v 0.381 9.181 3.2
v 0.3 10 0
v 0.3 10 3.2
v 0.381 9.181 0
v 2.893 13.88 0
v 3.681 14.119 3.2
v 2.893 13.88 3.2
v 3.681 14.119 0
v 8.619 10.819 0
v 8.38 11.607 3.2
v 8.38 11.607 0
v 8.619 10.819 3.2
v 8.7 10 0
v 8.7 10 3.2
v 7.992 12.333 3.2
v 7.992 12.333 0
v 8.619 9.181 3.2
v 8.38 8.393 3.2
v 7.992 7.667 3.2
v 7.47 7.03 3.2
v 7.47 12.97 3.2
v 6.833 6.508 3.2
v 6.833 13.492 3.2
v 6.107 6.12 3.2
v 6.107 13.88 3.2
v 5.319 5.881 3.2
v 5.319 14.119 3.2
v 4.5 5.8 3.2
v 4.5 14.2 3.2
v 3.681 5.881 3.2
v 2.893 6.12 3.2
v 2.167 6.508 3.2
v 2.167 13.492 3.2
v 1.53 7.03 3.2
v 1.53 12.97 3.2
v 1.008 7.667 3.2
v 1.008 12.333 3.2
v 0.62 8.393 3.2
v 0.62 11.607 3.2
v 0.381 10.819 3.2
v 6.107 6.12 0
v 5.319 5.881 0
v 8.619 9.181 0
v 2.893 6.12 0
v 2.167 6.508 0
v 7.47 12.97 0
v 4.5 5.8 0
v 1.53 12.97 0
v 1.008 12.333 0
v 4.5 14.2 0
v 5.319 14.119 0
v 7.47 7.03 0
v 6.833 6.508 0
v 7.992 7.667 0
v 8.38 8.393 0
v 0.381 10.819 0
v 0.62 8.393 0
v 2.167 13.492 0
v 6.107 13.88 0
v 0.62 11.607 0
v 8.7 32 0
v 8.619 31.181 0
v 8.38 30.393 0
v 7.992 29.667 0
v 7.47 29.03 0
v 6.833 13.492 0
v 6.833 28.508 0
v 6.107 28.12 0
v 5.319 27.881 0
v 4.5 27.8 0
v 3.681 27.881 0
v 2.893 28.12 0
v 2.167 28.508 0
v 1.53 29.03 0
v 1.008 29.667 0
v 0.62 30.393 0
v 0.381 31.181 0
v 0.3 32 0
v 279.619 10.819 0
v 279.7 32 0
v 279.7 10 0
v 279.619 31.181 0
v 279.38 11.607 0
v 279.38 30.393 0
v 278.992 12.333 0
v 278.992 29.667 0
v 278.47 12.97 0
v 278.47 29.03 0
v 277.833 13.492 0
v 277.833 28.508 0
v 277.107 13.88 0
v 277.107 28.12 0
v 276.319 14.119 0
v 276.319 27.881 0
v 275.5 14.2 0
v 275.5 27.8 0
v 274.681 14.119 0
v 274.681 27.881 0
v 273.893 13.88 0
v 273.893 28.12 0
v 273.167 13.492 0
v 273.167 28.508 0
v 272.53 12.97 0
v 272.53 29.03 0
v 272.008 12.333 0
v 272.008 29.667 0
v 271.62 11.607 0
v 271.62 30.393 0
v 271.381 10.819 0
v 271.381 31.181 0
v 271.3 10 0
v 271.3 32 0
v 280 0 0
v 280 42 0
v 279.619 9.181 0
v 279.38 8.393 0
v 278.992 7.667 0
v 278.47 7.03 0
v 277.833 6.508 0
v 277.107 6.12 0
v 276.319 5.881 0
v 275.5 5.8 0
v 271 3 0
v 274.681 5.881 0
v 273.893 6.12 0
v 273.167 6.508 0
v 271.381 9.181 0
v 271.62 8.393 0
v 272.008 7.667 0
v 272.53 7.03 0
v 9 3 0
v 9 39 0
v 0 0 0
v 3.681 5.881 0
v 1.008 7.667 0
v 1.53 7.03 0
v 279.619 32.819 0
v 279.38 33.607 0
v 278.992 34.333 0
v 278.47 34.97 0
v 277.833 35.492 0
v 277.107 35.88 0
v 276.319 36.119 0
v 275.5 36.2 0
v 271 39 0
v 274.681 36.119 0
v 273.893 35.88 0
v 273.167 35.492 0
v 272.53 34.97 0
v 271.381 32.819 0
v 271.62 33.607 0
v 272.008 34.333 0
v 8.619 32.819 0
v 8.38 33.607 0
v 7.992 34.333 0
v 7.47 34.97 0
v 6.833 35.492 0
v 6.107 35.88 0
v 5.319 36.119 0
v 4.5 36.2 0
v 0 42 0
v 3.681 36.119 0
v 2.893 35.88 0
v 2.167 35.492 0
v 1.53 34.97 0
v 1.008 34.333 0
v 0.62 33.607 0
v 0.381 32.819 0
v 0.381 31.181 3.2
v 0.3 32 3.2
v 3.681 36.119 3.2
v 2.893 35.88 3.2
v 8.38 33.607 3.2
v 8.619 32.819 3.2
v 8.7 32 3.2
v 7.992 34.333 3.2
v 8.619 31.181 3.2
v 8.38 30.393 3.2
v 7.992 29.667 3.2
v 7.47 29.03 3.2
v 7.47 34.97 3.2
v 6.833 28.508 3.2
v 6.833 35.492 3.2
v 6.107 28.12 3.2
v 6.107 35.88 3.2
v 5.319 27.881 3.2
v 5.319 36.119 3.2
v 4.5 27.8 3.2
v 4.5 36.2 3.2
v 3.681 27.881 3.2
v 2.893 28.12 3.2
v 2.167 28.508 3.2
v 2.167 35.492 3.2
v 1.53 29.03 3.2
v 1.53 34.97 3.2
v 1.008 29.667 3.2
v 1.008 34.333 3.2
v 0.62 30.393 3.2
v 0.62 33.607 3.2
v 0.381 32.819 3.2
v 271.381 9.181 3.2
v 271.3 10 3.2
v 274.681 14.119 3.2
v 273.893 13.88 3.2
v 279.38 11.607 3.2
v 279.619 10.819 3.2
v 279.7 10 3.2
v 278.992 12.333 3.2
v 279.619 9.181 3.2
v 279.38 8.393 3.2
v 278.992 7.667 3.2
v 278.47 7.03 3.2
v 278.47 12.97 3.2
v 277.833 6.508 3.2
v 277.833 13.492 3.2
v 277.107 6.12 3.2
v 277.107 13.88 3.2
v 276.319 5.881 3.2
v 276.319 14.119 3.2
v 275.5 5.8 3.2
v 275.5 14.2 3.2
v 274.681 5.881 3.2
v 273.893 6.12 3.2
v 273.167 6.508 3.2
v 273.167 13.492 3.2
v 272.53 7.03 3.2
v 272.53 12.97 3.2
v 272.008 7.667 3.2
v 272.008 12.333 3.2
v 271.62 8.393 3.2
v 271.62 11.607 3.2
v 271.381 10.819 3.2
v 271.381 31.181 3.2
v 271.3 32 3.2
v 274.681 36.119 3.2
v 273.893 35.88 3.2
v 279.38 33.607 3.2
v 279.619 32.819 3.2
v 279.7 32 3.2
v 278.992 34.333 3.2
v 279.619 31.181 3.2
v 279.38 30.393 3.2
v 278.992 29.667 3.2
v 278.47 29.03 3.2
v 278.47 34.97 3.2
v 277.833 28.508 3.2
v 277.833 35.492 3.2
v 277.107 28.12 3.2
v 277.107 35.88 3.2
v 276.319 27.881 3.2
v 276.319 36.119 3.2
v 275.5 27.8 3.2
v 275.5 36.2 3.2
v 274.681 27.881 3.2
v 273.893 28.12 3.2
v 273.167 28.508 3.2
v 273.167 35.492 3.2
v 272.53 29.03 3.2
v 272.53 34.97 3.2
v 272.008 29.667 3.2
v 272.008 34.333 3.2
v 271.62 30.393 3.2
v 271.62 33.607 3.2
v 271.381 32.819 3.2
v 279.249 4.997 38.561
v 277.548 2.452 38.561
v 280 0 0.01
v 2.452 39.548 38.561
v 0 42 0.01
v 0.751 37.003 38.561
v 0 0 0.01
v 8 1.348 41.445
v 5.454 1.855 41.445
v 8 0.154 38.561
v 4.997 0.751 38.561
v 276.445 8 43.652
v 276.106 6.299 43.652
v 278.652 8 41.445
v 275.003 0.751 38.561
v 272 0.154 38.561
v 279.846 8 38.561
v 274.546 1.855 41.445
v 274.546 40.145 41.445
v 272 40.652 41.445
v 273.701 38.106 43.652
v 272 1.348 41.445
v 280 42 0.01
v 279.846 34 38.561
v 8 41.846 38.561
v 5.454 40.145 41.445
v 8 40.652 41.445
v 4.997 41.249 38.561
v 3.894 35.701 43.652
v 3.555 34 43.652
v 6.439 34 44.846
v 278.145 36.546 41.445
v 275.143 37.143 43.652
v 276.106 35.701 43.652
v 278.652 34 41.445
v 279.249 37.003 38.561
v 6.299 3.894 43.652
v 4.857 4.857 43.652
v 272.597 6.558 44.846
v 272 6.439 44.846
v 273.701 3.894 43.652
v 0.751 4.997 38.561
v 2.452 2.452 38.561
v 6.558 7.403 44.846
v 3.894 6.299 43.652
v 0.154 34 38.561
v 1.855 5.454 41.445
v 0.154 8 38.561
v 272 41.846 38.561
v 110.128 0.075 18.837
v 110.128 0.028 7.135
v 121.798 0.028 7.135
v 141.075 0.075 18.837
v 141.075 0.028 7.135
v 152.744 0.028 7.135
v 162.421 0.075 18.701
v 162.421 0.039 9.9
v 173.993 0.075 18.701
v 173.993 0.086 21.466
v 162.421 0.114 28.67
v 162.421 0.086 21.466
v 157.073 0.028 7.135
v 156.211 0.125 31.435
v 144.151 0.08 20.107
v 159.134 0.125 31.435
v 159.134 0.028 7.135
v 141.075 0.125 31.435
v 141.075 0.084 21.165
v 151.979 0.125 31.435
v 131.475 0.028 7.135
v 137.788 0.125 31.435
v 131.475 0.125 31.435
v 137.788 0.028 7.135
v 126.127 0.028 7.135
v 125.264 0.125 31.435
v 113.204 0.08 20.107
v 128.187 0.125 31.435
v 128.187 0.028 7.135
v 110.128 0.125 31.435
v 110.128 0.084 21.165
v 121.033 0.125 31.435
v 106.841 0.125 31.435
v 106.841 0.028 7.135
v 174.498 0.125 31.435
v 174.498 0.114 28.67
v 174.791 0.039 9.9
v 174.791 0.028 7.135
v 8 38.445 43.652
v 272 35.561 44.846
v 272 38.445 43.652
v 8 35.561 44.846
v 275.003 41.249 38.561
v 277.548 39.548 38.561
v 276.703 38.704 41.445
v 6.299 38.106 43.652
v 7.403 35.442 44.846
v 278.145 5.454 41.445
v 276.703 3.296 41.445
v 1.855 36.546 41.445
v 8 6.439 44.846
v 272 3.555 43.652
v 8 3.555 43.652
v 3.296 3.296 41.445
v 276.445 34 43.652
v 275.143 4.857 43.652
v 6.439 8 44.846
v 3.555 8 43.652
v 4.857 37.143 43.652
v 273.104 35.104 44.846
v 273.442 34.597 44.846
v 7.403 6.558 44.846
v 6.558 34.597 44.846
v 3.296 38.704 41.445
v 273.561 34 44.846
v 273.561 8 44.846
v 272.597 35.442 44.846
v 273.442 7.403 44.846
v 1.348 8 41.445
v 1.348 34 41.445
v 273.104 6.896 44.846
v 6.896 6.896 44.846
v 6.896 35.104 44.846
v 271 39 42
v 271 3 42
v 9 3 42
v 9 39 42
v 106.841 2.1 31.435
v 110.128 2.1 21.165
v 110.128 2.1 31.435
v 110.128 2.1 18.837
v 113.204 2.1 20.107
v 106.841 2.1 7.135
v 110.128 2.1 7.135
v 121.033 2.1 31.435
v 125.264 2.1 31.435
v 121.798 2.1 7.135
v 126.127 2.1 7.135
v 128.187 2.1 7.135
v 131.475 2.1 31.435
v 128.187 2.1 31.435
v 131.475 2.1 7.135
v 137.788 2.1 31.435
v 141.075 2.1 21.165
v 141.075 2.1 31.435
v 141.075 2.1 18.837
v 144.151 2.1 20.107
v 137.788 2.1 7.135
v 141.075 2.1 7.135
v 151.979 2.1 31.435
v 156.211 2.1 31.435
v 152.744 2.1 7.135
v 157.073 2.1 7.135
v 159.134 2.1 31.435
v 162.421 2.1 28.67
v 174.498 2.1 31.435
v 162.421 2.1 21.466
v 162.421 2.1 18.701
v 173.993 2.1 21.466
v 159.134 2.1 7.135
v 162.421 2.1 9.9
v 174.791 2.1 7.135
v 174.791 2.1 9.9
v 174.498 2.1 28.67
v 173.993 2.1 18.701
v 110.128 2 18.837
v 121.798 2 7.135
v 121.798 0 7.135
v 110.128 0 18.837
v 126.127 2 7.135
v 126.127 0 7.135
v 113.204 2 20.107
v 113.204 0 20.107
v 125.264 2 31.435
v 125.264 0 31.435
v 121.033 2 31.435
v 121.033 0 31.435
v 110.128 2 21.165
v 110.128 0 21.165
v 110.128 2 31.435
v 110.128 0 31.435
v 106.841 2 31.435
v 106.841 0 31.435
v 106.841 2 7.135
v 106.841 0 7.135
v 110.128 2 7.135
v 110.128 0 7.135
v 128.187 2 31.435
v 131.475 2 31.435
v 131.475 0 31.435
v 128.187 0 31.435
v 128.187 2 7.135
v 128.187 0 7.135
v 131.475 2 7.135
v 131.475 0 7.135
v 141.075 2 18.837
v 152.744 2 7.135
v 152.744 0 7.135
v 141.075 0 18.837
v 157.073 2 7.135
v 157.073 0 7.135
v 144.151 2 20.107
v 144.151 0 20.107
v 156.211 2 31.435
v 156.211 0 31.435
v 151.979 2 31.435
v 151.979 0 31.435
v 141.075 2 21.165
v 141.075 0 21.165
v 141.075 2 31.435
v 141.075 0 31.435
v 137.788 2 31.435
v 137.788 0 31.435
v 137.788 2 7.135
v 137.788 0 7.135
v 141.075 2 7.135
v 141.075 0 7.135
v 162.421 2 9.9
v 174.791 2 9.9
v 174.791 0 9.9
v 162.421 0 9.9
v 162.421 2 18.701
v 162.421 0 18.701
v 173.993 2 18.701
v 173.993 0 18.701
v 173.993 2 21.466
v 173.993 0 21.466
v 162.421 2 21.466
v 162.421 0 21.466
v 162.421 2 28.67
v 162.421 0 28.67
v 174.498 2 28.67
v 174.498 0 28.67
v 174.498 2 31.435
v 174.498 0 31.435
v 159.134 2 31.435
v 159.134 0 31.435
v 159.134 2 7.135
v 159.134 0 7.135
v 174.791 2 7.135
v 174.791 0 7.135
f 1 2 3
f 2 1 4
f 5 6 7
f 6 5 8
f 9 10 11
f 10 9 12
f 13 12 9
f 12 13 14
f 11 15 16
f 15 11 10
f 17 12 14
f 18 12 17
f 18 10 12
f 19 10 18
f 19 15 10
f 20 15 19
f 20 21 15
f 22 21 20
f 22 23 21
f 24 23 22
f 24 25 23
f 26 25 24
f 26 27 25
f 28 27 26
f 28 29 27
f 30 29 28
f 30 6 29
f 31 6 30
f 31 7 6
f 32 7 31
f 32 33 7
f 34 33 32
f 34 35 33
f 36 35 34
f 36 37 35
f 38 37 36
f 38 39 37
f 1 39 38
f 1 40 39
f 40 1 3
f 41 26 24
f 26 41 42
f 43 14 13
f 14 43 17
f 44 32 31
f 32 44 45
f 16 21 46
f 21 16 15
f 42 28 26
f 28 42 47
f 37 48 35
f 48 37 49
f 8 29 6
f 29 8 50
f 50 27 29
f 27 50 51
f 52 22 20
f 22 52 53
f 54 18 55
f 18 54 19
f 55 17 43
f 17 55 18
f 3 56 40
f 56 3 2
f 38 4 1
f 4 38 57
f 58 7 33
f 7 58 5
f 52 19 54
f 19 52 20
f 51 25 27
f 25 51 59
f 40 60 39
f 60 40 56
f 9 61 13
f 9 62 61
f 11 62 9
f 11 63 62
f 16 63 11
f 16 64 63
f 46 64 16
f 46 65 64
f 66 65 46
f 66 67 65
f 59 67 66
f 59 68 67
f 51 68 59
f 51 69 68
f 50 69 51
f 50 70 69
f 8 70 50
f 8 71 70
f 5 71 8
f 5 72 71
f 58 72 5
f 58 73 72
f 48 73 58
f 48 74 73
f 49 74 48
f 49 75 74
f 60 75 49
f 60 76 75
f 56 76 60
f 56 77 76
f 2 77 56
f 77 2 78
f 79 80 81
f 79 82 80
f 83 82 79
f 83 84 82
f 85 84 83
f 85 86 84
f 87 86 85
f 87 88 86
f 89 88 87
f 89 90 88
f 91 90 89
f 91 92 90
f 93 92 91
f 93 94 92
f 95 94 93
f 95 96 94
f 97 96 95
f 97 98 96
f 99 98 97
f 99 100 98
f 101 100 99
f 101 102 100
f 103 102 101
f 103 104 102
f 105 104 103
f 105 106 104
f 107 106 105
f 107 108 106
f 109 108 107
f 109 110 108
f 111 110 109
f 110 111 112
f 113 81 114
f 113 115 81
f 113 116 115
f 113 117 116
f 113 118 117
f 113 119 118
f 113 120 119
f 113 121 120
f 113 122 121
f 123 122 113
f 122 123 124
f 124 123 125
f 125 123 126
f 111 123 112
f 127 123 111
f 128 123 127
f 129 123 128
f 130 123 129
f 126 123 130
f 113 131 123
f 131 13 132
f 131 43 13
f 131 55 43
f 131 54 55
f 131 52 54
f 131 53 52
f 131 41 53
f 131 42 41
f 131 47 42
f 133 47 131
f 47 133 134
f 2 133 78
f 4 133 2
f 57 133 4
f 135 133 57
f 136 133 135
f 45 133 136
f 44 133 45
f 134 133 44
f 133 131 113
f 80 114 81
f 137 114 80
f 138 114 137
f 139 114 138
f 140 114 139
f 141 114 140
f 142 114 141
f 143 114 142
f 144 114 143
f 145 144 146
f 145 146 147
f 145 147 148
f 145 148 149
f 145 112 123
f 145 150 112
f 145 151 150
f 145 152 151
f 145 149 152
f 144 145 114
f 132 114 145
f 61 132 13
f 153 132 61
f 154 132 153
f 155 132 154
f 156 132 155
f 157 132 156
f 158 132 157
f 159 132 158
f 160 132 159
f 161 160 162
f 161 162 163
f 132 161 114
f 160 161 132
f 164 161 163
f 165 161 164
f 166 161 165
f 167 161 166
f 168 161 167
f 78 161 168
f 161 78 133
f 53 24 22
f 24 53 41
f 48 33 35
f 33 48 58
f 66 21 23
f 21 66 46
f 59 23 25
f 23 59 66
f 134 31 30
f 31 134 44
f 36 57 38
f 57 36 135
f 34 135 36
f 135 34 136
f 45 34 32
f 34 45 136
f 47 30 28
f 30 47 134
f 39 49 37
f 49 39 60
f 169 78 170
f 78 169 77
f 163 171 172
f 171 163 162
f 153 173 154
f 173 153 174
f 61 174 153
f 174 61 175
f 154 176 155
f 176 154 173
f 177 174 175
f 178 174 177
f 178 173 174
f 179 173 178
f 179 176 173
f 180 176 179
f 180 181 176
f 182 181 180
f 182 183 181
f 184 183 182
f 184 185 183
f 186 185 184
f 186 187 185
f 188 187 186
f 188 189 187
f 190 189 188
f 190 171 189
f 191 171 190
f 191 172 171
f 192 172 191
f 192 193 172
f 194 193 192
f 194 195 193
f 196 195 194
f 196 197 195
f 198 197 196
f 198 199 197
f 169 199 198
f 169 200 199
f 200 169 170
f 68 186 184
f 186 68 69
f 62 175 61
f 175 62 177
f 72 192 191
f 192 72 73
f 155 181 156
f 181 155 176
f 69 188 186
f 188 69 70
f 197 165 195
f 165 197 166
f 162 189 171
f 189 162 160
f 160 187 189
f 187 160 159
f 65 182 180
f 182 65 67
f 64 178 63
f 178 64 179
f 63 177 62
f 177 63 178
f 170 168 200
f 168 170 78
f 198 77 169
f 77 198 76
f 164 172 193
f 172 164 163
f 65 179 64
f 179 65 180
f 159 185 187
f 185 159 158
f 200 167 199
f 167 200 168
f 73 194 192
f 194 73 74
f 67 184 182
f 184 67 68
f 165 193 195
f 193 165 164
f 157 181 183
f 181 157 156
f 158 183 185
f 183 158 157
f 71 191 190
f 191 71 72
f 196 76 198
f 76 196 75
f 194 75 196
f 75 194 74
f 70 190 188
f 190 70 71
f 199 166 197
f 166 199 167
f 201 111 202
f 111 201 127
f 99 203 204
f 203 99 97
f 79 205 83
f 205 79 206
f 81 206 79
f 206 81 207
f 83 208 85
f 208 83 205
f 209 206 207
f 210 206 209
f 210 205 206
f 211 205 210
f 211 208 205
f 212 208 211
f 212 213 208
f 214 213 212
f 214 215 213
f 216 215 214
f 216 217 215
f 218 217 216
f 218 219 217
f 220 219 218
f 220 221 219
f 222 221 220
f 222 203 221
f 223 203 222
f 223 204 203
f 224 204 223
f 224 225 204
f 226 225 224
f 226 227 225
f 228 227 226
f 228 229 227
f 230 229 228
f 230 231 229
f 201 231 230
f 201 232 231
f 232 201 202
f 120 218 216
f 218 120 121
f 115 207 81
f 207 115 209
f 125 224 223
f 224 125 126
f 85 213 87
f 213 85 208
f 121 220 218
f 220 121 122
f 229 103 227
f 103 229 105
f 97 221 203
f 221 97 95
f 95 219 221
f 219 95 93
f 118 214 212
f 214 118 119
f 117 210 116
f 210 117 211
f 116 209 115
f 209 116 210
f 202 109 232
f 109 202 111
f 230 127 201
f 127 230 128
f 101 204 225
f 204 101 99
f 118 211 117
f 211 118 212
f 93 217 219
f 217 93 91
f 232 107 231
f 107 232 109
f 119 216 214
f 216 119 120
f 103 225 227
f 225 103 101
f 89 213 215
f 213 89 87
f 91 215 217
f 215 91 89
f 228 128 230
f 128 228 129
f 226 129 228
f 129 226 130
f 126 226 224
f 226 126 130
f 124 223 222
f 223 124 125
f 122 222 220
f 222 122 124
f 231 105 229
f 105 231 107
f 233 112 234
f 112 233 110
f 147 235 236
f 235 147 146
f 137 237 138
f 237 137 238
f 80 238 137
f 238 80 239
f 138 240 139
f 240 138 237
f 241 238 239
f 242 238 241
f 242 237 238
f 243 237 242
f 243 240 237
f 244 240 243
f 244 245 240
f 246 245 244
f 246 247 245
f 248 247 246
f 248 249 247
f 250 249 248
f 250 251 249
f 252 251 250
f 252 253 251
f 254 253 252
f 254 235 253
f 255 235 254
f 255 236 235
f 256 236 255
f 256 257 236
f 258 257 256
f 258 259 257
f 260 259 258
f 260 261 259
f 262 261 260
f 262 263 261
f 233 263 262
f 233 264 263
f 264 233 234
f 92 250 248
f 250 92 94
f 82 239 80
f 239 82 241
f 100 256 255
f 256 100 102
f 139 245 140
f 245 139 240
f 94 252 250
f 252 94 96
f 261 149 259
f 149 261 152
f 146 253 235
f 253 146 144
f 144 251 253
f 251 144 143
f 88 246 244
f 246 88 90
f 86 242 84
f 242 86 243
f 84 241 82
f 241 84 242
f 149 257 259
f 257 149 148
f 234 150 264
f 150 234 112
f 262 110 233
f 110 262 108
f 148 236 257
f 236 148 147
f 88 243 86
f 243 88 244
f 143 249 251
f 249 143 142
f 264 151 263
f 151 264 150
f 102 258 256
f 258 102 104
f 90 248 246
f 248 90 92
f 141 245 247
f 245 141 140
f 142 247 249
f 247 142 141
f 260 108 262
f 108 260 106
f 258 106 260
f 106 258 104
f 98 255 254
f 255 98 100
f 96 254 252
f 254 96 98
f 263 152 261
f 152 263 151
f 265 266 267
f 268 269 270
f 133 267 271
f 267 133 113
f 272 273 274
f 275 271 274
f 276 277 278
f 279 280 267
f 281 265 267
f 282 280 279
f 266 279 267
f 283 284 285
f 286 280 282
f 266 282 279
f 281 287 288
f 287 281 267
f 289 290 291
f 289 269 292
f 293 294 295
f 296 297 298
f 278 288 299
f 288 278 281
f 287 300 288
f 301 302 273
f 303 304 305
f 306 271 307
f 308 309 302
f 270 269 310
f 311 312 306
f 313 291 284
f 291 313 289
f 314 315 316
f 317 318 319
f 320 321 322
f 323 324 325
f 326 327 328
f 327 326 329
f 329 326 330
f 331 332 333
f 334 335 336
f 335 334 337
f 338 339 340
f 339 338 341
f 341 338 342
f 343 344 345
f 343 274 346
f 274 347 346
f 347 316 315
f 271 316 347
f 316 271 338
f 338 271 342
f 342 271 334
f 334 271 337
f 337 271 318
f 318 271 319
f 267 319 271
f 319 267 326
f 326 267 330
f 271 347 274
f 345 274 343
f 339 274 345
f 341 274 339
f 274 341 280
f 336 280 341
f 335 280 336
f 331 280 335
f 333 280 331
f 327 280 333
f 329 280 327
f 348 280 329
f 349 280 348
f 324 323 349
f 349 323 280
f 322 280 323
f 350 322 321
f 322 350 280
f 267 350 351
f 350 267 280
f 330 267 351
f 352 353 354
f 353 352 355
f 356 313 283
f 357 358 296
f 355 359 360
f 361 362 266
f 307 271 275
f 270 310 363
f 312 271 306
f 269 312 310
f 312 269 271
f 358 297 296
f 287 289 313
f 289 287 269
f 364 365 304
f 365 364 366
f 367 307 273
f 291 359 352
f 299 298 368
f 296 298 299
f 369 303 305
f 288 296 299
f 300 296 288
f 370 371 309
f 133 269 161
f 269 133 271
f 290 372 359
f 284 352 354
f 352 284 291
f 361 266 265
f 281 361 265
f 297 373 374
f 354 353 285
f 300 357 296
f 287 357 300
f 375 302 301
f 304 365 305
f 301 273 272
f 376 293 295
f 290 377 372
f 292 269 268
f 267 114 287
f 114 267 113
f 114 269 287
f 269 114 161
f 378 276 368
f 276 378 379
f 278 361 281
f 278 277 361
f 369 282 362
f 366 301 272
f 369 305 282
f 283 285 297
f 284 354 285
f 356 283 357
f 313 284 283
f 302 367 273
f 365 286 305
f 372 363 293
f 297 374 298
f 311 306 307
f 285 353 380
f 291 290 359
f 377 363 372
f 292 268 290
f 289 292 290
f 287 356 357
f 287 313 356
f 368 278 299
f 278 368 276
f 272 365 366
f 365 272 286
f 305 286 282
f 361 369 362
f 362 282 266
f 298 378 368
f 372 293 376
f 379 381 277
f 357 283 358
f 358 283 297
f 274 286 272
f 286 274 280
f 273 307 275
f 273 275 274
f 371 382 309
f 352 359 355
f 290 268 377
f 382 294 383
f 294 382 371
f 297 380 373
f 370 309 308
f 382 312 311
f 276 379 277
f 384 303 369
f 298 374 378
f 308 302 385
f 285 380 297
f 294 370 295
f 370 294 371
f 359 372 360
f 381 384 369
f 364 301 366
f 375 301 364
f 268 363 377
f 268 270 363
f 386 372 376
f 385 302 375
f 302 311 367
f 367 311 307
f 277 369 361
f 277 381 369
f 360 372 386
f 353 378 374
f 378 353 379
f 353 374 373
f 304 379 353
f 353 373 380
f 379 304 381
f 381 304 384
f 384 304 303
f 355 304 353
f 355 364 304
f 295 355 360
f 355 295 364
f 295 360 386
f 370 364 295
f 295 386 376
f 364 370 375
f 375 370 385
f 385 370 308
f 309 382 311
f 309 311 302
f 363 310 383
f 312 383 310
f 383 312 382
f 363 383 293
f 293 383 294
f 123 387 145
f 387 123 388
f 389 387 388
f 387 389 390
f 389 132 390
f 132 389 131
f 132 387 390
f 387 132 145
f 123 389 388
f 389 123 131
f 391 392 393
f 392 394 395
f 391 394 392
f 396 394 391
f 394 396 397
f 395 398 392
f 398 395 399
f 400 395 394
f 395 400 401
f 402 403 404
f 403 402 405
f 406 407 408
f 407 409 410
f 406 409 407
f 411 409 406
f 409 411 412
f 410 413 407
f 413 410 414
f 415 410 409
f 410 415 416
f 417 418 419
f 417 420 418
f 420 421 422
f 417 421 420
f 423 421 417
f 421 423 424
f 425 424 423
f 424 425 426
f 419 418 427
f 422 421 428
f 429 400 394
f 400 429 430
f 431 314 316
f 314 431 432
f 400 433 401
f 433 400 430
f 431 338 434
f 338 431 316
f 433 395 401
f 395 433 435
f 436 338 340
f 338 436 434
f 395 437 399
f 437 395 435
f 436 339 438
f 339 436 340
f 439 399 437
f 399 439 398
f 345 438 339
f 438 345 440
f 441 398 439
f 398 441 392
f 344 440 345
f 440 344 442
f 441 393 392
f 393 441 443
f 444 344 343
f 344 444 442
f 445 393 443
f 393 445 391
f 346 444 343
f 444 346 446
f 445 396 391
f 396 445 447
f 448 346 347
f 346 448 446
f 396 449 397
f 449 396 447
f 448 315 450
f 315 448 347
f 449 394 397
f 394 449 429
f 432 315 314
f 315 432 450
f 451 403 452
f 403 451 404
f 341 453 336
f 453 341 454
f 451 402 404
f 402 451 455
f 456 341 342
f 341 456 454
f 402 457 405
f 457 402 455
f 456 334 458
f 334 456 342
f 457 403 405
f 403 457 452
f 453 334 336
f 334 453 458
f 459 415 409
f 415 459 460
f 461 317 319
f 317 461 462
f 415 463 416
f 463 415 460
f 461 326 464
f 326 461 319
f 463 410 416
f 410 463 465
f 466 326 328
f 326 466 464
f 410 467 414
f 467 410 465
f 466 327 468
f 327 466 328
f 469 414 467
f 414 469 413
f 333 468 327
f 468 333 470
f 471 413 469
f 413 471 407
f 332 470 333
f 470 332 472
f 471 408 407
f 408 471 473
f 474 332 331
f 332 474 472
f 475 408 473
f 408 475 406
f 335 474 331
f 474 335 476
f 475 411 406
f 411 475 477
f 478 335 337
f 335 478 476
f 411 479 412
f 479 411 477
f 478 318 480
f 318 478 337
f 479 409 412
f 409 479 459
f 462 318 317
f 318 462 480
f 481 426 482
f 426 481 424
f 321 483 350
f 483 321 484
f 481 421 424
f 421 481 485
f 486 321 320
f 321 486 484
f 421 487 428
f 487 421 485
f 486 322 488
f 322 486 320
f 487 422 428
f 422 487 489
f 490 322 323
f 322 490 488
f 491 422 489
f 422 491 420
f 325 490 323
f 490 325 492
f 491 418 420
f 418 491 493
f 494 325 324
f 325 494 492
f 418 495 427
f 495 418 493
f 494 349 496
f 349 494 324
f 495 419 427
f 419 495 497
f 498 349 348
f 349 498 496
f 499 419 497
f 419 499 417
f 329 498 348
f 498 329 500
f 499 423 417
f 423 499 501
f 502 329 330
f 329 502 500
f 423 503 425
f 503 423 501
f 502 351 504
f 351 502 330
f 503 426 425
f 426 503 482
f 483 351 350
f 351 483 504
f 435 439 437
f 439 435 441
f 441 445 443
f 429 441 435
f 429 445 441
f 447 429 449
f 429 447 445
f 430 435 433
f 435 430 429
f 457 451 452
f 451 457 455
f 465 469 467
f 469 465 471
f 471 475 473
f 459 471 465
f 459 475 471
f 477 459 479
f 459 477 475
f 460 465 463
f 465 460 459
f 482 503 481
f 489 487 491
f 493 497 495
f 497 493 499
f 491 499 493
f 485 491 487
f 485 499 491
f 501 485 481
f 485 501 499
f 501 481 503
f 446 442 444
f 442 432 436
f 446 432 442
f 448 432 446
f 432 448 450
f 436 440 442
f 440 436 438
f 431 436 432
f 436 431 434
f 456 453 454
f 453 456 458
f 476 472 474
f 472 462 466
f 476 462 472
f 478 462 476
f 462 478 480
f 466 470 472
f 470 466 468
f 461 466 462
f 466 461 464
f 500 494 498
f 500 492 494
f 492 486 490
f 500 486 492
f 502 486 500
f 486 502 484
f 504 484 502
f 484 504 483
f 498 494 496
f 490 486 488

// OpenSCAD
// PrimeBind Influencer Case — Named Cap: KIKE
// Two-color multi-material print for K2 Plus CFS.
// Cap body prints in BLACK (Filament 1), name fill prints in WHITE (Filament 2).
// Both STLs share the same coordinate origin — load together in OrcaSlicer as
// one object with two parts for automatic alignment.
//
// ─── FONT NOTE ───────────────────────────────────────────────────────────────
//   Uses Bunken Tech Sans Pro ExtraBold Italic — PrimeBind brand font.
//   Font file: primebindfont.ttf (in this directory).
//   Install: double-click primebindfont.ttf → Install Font
//   Restart OpenSCAD. Verify: Help → Font List → search "Bunken Tech Sans Pro".
//
// ─── EXPORT WORKFLOW ─────────────────────────────────────────────────────────
//   STL 1 (black cap):  comment out name_fill() at bottom → Export as STL
//                       → save as pb_cap_kike_black.stl
//   STL 2 (white fill): comment out cap_named() at bottom → Export as STL
//                       → save as pb_cap_kike_white.stl
//
// ─── ORCASLICER MULTI-COLOR WORKFLOW ────────────────────────────────────────
//   1. File → New Project
//   2. Import pb_cap_kike_black.stl  (DO NOT rotate — open bottom must face bed)
//   3. Right-click cap → Add Part → select pb_cap_kike_white.stl
//   4. In Objects list: select the white part → set Filament = 2 (white)
//   5. Slice — K2 Plus CFS auto-switches filament for the letter layers

// ─── SHARED DIMS (must match pb_influencer_magnet.scad exactly) ──────────────
binder_w   = 260;
binder_d   = 34;
fit_gap    = 2.0;
face_wall  = 3.0;
side_wall  = 9.0;
inner_w    = binder_w + fit_gap;          // 262
inner_d    = binder_d + fit_gap;          // 36
outer_w    = inner_w + 2*side_wall;       // 280
outer_d    = inner_d + 2*face_wall;       // 42
cap_h      = 45;
r_edge     = 8.0;

// ─── MAGNETS ─────────────────────────────────────────────────────────────────
mag_r       = 4.2;
mag_dep     = 3.2;
mag_y_front = 10;
mag_y_back  = outer_d - 10;   // 32

// ─── NAME ────────────────────────────────────────────────────────────────────
name_text   = "KIKE";
text_font   = "Bunken Tech Sans Pro ExBd:style=ExtraBold Italic";
text_size   = 24;
text_depth  = 2.0;            // depth of pocket AND thickness of fill piece
text_x      = outer_w / 2;   // centered left-right on front face
text_z      = cap_h / 2 - 3.5;

$fn = 32;

// ─── ROUNDED BOX HELPER ──────────────────────────────────────────────────────
module rrect_flat_bottom(x, y, z, r) {
    hull() {
        cube([x, y, 0.01]);
        for (xi = [r, x-r]) for (yi = [r, y-r])
            translate([xi, yi, z-r]) sphere(r=r, $fn=16);
    }
}

// ─── NAME POCKET ─────────────────────────────────────────────────────────────
// Cuts 2mm into the front face (Y=0 side). The 0.1 overcut ensures clean mesh.
module name_pocket() {
    translate([text_x, text_depth + 0.1, text_z])
        rotate([90, 0, 0])
            linear_extrude(height = text_depth + 0.1)
                text(name_text, size=text_size, font=text_font,
                     halign="center", valign="center");
}

// ─── NAME FILL (white part — same coordinates as pocket) ─────────────────────
// Sits at Y=0..text_depth — exactly fills the pocket, flush with exterior face.
// This is Filament 2 (white) in OrcaSlicer.
module name_fill() {
    color("white")
    translate([text_x, text_depth, text_z])
        rotate([90, 0, 0])
            linear_extrude(height = text_depth)
                text(name_text, size=text_size, font=text_font,
                     halign="center", valign="center");
}

// ─── CAP BODY (black) ────────────────────────────────────────────────────────
module cap_named() {
    difference() {
        rrect_flat_bottom(outer_w, outer_d, cap_h, r_edge);

        // interior cavity
        translate([side_wall, face_wall, 0])
            cube([inner_w, inner_d, cap_h - face_wall]);

        // magnet pockets — start at Z=0 so cap bottom stays flat on bed
        for (mx = [side_wall/2, outer_w - side_wall/2])
            for (my = [mag_y_front, mag_y_back])
                translate([mx, my, 0])
                    cylinder(r=mag_r, h=mag_dep);

        // name pocket on front face
        name_pocket();
    }
}

// ─── RENDER ──────────────────────────────────────────────────────────────────
// Preview: both parts assembled (shows final look).
// To export black STL: comment out name_fill()
// To export white STL: comment out cap_named()
color("dimgray") cap_named();
name_fill();
